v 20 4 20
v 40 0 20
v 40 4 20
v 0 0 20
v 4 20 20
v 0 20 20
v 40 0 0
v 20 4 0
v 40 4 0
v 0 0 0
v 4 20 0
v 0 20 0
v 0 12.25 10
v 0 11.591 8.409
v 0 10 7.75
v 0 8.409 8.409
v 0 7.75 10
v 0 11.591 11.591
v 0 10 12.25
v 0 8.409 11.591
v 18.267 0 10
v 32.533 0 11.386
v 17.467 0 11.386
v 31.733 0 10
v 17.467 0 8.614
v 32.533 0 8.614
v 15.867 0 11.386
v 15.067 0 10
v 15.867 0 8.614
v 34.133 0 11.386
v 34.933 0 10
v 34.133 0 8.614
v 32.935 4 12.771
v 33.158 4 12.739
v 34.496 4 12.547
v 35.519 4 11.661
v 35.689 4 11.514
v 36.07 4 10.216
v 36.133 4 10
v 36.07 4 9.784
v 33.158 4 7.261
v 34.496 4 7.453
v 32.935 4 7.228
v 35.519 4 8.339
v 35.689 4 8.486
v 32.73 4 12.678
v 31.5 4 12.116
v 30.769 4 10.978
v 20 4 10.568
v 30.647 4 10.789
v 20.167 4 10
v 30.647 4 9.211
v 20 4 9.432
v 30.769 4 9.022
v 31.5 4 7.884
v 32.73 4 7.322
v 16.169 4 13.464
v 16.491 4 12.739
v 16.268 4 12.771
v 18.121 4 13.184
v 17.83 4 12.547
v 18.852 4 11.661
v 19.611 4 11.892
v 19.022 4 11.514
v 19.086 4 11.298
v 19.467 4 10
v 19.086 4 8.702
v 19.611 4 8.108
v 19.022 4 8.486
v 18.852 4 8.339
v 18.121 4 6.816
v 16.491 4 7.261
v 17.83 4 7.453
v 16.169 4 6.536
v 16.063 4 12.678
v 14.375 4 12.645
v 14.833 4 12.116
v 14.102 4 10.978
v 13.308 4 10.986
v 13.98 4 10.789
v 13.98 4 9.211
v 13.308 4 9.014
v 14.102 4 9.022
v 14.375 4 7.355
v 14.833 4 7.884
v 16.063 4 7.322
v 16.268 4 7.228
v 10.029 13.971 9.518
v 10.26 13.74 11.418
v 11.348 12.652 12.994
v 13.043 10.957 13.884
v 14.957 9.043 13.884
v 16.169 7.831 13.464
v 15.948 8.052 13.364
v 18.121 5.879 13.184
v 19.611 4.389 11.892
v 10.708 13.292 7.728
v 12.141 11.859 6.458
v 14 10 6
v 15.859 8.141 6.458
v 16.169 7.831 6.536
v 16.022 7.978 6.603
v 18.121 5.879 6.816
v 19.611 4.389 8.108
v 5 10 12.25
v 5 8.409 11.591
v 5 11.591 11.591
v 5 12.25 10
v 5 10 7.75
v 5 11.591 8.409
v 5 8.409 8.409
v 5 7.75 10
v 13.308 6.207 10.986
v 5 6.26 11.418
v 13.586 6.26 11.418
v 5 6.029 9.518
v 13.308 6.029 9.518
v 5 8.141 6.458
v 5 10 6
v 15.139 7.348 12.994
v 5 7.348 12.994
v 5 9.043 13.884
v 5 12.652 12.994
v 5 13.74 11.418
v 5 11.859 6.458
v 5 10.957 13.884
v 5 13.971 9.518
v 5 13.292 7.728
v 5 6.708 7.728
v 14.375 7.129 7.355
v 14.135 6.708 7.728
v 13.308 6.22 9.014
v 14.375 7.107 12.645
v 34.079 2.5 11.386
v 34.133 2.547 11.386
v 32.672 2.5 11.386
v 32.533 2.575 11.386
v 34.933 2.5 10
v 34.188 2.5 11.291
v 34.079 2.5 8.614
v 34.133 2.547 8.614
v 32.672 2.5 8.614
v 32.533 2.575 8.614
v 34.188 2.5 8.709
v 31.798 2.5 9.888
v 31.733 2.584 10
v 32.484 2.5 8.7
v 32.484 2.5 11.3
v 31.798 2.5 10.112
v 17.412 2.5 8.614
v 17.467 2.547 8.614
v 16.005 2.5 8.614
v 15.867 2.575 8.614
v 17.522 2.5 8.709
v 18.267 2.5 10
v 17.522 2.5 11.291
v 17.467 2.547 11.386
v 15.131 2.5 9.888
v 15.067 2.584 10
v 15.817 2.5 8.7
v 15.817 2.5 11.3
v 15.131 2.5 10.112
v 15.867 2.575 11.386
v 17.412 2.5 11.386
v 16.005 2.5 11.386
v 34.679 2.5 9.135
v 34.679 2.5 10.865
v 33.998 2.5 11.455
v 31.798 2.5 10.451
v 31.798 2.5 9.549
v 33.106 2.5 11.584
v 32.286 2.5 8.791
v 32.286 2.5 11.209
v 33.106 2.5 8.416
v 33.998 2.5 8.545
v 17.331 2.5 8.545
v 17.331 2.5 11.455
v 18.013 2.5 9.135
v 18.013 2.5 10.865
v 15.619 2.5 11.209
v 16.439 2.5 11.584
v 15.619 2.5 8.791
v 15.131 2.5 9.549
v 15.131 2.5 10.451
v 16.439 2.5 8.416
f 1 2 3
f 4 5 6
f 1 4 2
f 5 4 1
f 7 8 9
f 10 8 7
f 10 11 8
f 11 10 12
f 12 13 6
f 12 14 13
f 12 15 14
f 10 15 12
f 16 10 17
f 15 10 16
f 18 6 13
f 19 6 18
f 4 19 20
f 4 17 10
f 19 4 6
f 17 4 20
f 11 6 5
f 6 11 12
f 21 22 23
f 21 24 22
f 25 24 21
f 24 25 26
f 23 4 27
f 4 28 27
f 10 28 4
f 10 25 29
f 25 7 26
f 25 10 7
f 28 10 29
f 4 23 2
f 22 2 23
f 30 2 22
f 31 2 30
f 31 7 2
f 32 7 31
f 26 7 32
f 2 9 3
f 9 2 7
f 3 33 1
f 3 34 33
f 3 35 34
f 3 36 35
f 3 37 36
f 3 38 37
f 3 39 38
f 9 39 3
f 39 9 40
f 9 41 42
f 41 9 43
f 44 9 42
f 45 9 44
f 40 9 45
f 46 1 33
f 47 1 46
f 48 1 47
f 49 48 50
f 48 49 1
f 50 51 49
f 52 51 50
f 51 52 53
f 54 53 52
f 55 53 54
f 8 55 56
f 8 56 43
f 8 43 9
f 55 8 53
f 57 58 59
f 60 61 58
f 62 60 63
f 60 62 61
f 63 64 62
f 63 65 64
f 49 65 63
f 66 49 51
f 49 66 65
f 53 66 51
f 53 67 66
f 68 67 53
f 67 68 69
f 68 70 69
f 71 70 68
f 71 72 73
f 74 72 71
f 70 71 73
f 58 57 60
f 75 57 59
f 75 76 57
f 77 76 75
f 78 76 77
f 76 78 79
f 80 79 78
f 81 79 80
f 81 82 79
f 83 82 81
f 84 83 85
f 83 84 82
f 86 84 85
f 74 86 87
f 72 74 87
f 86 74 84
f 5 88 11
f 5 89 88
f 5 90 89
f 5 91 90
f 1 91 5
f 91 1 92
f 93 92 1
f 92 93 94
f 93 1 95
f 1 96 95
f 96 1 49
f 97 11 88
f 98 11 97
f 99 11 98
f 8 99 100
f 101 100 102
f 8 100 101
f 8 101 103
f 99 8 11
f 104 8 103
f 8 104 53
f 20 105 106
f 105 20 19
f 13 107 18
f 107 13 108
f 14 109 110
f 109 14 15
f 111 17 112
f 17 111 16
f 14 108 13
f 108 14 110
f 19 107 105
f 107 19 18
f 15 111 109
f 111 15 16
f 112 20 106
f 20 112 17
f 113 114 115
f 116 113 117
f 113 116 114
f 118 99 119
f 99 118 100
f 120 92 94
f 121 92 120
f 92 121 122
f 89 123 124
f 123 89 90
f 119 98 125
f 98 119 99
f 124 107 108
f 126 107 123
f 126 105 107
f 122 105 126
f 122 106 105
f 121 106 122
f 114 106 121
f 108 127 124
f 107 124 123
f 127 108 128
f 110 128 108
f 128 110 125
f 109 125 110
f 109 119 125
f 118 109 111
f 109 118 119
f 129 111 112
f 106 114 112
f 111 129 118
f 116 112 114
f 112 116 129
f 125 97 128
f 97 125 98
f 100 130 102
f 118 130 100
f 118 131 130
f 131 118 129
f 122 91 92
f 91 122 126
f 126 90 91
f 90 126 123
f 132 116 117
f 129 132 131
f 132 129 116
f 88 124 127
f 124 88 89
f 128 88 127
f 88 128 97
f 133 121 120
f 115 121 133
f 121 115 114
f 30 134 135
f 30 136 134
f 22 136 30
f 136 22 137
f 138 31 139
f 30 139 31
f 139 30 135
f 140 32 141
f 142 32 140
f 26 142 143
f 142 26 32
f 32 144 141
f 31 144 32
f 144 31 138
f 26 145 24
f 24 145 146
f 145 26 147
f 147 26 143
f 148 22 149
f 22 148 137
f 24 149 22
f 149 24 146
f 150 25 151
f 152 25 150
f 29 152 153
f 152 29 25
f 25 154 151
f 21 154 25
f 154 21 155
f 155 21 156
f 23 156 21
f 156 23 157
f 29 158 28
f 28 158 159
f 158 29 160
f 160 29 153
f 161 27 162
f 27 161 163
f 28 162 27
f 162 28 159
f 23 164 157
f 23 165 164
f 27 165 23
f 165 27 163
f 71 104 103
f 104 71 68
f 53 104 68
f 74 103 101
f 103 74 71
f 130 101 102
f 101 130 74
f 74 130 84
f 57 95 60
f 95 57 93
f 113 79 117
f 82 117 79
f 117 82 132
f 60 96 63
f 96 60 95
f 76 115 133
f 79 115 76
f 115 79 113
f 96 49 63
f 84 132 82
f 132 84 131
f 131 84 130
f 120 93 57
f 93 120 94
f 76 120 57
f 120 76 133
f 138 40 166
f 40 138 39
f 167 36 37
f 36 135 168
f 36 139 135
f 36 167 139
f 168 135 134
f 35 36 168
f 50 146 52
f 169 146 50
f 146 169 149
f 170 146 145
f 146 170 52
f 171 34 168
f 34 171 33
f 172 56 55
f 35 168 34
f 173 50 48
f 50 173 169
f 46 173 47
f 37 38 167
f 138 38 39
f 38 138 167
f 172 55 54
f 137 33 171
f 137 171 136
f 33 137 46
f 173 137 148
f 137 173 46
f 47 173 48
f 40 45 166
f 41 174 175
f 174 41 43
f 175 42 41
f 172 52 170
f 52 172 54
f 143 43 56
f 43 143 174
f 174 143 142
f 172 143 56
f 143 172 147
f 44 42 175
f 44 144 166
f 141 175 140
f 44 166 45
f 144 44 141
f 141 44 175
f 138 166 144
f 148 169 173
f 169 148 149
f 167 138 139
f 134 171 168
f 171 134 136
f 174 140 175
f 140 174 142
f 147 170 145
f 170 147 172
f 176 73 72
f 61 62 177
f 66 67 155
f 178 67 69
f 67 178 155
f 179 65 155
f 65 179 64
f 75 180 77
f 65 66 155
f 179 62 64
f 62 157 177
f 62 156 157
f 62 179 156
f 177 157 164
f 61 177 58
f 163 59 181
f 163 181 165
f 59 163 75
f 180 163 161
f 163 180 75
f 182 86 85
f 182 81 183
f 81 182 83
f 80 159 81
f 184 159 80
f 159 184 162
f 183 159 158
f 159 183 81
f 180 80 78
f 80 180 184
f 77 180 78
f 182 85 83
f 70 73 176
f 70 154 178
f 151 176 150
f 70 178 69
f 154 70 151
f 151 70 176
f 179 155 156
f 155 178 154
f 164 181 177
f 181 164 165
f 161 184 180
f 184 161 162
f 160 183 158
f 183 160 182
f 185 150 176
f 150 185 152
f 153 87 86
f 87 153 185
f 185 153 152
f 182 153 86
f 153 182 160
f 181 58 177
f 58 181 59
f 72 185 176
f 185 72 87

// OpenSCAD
/**
 * plankHolder.scad
 * 
 * This is a piece designed to hold a woden plank to a aluminium beam (20x20 I-type)
 * 
 * Created by Diego Viejo
 * 29/Jan/2016
 */

height = 4;
side = 20;

hypo = sqrt(side*side+side*side);

module plankHolderBase()
union()
{
    cube(side);
    cube([side*2, height, side]);
}


module plankHolderHoles()
{
    translate([0, hypo*sin(45)+height, -1])
        rotate(-45)
            cube([hypo, side, side+2]);
            
    //bolt for the beam
    translate([-1, side/2, side/2])
        rotate([0, 90, 0])
            cylinder(d=4.5, h=side);
    translate([5, side/2, side/2])
        rotate([0, 90, 0])
            cylinder(d=8, h=side);
    
    //bolts for the plank
    translate([2*side-side/3, -1, side/2])
        rotate([-90, 0, 0])
            cylinder(d=3.2, h=height+2);
    translate([side-side/6, -1, side/2])
        rotate([-90, 0, 0])
            cylinder(d=3.2, h=side);
    translate([side-side/6, height, side/2])
        rotate([-90, 0, 0])
            cylinder(d=7, h=side);
    translate([2*side-side/3, height-1.5, side/2])
        rotate([-90, 0, 0])
            cylinder(d1=3.2, d2=6.4, h=2);
    translate([side-side/6, height-1.5, side/2])
        rotate([-90, 0, 0])
            cylinder(d1=3.2, d2=6.4, h=2);
}


module plankHolder()
difference()
{
    plankHolderBase();
    plankHolderHoles();
}

plankHolder();
